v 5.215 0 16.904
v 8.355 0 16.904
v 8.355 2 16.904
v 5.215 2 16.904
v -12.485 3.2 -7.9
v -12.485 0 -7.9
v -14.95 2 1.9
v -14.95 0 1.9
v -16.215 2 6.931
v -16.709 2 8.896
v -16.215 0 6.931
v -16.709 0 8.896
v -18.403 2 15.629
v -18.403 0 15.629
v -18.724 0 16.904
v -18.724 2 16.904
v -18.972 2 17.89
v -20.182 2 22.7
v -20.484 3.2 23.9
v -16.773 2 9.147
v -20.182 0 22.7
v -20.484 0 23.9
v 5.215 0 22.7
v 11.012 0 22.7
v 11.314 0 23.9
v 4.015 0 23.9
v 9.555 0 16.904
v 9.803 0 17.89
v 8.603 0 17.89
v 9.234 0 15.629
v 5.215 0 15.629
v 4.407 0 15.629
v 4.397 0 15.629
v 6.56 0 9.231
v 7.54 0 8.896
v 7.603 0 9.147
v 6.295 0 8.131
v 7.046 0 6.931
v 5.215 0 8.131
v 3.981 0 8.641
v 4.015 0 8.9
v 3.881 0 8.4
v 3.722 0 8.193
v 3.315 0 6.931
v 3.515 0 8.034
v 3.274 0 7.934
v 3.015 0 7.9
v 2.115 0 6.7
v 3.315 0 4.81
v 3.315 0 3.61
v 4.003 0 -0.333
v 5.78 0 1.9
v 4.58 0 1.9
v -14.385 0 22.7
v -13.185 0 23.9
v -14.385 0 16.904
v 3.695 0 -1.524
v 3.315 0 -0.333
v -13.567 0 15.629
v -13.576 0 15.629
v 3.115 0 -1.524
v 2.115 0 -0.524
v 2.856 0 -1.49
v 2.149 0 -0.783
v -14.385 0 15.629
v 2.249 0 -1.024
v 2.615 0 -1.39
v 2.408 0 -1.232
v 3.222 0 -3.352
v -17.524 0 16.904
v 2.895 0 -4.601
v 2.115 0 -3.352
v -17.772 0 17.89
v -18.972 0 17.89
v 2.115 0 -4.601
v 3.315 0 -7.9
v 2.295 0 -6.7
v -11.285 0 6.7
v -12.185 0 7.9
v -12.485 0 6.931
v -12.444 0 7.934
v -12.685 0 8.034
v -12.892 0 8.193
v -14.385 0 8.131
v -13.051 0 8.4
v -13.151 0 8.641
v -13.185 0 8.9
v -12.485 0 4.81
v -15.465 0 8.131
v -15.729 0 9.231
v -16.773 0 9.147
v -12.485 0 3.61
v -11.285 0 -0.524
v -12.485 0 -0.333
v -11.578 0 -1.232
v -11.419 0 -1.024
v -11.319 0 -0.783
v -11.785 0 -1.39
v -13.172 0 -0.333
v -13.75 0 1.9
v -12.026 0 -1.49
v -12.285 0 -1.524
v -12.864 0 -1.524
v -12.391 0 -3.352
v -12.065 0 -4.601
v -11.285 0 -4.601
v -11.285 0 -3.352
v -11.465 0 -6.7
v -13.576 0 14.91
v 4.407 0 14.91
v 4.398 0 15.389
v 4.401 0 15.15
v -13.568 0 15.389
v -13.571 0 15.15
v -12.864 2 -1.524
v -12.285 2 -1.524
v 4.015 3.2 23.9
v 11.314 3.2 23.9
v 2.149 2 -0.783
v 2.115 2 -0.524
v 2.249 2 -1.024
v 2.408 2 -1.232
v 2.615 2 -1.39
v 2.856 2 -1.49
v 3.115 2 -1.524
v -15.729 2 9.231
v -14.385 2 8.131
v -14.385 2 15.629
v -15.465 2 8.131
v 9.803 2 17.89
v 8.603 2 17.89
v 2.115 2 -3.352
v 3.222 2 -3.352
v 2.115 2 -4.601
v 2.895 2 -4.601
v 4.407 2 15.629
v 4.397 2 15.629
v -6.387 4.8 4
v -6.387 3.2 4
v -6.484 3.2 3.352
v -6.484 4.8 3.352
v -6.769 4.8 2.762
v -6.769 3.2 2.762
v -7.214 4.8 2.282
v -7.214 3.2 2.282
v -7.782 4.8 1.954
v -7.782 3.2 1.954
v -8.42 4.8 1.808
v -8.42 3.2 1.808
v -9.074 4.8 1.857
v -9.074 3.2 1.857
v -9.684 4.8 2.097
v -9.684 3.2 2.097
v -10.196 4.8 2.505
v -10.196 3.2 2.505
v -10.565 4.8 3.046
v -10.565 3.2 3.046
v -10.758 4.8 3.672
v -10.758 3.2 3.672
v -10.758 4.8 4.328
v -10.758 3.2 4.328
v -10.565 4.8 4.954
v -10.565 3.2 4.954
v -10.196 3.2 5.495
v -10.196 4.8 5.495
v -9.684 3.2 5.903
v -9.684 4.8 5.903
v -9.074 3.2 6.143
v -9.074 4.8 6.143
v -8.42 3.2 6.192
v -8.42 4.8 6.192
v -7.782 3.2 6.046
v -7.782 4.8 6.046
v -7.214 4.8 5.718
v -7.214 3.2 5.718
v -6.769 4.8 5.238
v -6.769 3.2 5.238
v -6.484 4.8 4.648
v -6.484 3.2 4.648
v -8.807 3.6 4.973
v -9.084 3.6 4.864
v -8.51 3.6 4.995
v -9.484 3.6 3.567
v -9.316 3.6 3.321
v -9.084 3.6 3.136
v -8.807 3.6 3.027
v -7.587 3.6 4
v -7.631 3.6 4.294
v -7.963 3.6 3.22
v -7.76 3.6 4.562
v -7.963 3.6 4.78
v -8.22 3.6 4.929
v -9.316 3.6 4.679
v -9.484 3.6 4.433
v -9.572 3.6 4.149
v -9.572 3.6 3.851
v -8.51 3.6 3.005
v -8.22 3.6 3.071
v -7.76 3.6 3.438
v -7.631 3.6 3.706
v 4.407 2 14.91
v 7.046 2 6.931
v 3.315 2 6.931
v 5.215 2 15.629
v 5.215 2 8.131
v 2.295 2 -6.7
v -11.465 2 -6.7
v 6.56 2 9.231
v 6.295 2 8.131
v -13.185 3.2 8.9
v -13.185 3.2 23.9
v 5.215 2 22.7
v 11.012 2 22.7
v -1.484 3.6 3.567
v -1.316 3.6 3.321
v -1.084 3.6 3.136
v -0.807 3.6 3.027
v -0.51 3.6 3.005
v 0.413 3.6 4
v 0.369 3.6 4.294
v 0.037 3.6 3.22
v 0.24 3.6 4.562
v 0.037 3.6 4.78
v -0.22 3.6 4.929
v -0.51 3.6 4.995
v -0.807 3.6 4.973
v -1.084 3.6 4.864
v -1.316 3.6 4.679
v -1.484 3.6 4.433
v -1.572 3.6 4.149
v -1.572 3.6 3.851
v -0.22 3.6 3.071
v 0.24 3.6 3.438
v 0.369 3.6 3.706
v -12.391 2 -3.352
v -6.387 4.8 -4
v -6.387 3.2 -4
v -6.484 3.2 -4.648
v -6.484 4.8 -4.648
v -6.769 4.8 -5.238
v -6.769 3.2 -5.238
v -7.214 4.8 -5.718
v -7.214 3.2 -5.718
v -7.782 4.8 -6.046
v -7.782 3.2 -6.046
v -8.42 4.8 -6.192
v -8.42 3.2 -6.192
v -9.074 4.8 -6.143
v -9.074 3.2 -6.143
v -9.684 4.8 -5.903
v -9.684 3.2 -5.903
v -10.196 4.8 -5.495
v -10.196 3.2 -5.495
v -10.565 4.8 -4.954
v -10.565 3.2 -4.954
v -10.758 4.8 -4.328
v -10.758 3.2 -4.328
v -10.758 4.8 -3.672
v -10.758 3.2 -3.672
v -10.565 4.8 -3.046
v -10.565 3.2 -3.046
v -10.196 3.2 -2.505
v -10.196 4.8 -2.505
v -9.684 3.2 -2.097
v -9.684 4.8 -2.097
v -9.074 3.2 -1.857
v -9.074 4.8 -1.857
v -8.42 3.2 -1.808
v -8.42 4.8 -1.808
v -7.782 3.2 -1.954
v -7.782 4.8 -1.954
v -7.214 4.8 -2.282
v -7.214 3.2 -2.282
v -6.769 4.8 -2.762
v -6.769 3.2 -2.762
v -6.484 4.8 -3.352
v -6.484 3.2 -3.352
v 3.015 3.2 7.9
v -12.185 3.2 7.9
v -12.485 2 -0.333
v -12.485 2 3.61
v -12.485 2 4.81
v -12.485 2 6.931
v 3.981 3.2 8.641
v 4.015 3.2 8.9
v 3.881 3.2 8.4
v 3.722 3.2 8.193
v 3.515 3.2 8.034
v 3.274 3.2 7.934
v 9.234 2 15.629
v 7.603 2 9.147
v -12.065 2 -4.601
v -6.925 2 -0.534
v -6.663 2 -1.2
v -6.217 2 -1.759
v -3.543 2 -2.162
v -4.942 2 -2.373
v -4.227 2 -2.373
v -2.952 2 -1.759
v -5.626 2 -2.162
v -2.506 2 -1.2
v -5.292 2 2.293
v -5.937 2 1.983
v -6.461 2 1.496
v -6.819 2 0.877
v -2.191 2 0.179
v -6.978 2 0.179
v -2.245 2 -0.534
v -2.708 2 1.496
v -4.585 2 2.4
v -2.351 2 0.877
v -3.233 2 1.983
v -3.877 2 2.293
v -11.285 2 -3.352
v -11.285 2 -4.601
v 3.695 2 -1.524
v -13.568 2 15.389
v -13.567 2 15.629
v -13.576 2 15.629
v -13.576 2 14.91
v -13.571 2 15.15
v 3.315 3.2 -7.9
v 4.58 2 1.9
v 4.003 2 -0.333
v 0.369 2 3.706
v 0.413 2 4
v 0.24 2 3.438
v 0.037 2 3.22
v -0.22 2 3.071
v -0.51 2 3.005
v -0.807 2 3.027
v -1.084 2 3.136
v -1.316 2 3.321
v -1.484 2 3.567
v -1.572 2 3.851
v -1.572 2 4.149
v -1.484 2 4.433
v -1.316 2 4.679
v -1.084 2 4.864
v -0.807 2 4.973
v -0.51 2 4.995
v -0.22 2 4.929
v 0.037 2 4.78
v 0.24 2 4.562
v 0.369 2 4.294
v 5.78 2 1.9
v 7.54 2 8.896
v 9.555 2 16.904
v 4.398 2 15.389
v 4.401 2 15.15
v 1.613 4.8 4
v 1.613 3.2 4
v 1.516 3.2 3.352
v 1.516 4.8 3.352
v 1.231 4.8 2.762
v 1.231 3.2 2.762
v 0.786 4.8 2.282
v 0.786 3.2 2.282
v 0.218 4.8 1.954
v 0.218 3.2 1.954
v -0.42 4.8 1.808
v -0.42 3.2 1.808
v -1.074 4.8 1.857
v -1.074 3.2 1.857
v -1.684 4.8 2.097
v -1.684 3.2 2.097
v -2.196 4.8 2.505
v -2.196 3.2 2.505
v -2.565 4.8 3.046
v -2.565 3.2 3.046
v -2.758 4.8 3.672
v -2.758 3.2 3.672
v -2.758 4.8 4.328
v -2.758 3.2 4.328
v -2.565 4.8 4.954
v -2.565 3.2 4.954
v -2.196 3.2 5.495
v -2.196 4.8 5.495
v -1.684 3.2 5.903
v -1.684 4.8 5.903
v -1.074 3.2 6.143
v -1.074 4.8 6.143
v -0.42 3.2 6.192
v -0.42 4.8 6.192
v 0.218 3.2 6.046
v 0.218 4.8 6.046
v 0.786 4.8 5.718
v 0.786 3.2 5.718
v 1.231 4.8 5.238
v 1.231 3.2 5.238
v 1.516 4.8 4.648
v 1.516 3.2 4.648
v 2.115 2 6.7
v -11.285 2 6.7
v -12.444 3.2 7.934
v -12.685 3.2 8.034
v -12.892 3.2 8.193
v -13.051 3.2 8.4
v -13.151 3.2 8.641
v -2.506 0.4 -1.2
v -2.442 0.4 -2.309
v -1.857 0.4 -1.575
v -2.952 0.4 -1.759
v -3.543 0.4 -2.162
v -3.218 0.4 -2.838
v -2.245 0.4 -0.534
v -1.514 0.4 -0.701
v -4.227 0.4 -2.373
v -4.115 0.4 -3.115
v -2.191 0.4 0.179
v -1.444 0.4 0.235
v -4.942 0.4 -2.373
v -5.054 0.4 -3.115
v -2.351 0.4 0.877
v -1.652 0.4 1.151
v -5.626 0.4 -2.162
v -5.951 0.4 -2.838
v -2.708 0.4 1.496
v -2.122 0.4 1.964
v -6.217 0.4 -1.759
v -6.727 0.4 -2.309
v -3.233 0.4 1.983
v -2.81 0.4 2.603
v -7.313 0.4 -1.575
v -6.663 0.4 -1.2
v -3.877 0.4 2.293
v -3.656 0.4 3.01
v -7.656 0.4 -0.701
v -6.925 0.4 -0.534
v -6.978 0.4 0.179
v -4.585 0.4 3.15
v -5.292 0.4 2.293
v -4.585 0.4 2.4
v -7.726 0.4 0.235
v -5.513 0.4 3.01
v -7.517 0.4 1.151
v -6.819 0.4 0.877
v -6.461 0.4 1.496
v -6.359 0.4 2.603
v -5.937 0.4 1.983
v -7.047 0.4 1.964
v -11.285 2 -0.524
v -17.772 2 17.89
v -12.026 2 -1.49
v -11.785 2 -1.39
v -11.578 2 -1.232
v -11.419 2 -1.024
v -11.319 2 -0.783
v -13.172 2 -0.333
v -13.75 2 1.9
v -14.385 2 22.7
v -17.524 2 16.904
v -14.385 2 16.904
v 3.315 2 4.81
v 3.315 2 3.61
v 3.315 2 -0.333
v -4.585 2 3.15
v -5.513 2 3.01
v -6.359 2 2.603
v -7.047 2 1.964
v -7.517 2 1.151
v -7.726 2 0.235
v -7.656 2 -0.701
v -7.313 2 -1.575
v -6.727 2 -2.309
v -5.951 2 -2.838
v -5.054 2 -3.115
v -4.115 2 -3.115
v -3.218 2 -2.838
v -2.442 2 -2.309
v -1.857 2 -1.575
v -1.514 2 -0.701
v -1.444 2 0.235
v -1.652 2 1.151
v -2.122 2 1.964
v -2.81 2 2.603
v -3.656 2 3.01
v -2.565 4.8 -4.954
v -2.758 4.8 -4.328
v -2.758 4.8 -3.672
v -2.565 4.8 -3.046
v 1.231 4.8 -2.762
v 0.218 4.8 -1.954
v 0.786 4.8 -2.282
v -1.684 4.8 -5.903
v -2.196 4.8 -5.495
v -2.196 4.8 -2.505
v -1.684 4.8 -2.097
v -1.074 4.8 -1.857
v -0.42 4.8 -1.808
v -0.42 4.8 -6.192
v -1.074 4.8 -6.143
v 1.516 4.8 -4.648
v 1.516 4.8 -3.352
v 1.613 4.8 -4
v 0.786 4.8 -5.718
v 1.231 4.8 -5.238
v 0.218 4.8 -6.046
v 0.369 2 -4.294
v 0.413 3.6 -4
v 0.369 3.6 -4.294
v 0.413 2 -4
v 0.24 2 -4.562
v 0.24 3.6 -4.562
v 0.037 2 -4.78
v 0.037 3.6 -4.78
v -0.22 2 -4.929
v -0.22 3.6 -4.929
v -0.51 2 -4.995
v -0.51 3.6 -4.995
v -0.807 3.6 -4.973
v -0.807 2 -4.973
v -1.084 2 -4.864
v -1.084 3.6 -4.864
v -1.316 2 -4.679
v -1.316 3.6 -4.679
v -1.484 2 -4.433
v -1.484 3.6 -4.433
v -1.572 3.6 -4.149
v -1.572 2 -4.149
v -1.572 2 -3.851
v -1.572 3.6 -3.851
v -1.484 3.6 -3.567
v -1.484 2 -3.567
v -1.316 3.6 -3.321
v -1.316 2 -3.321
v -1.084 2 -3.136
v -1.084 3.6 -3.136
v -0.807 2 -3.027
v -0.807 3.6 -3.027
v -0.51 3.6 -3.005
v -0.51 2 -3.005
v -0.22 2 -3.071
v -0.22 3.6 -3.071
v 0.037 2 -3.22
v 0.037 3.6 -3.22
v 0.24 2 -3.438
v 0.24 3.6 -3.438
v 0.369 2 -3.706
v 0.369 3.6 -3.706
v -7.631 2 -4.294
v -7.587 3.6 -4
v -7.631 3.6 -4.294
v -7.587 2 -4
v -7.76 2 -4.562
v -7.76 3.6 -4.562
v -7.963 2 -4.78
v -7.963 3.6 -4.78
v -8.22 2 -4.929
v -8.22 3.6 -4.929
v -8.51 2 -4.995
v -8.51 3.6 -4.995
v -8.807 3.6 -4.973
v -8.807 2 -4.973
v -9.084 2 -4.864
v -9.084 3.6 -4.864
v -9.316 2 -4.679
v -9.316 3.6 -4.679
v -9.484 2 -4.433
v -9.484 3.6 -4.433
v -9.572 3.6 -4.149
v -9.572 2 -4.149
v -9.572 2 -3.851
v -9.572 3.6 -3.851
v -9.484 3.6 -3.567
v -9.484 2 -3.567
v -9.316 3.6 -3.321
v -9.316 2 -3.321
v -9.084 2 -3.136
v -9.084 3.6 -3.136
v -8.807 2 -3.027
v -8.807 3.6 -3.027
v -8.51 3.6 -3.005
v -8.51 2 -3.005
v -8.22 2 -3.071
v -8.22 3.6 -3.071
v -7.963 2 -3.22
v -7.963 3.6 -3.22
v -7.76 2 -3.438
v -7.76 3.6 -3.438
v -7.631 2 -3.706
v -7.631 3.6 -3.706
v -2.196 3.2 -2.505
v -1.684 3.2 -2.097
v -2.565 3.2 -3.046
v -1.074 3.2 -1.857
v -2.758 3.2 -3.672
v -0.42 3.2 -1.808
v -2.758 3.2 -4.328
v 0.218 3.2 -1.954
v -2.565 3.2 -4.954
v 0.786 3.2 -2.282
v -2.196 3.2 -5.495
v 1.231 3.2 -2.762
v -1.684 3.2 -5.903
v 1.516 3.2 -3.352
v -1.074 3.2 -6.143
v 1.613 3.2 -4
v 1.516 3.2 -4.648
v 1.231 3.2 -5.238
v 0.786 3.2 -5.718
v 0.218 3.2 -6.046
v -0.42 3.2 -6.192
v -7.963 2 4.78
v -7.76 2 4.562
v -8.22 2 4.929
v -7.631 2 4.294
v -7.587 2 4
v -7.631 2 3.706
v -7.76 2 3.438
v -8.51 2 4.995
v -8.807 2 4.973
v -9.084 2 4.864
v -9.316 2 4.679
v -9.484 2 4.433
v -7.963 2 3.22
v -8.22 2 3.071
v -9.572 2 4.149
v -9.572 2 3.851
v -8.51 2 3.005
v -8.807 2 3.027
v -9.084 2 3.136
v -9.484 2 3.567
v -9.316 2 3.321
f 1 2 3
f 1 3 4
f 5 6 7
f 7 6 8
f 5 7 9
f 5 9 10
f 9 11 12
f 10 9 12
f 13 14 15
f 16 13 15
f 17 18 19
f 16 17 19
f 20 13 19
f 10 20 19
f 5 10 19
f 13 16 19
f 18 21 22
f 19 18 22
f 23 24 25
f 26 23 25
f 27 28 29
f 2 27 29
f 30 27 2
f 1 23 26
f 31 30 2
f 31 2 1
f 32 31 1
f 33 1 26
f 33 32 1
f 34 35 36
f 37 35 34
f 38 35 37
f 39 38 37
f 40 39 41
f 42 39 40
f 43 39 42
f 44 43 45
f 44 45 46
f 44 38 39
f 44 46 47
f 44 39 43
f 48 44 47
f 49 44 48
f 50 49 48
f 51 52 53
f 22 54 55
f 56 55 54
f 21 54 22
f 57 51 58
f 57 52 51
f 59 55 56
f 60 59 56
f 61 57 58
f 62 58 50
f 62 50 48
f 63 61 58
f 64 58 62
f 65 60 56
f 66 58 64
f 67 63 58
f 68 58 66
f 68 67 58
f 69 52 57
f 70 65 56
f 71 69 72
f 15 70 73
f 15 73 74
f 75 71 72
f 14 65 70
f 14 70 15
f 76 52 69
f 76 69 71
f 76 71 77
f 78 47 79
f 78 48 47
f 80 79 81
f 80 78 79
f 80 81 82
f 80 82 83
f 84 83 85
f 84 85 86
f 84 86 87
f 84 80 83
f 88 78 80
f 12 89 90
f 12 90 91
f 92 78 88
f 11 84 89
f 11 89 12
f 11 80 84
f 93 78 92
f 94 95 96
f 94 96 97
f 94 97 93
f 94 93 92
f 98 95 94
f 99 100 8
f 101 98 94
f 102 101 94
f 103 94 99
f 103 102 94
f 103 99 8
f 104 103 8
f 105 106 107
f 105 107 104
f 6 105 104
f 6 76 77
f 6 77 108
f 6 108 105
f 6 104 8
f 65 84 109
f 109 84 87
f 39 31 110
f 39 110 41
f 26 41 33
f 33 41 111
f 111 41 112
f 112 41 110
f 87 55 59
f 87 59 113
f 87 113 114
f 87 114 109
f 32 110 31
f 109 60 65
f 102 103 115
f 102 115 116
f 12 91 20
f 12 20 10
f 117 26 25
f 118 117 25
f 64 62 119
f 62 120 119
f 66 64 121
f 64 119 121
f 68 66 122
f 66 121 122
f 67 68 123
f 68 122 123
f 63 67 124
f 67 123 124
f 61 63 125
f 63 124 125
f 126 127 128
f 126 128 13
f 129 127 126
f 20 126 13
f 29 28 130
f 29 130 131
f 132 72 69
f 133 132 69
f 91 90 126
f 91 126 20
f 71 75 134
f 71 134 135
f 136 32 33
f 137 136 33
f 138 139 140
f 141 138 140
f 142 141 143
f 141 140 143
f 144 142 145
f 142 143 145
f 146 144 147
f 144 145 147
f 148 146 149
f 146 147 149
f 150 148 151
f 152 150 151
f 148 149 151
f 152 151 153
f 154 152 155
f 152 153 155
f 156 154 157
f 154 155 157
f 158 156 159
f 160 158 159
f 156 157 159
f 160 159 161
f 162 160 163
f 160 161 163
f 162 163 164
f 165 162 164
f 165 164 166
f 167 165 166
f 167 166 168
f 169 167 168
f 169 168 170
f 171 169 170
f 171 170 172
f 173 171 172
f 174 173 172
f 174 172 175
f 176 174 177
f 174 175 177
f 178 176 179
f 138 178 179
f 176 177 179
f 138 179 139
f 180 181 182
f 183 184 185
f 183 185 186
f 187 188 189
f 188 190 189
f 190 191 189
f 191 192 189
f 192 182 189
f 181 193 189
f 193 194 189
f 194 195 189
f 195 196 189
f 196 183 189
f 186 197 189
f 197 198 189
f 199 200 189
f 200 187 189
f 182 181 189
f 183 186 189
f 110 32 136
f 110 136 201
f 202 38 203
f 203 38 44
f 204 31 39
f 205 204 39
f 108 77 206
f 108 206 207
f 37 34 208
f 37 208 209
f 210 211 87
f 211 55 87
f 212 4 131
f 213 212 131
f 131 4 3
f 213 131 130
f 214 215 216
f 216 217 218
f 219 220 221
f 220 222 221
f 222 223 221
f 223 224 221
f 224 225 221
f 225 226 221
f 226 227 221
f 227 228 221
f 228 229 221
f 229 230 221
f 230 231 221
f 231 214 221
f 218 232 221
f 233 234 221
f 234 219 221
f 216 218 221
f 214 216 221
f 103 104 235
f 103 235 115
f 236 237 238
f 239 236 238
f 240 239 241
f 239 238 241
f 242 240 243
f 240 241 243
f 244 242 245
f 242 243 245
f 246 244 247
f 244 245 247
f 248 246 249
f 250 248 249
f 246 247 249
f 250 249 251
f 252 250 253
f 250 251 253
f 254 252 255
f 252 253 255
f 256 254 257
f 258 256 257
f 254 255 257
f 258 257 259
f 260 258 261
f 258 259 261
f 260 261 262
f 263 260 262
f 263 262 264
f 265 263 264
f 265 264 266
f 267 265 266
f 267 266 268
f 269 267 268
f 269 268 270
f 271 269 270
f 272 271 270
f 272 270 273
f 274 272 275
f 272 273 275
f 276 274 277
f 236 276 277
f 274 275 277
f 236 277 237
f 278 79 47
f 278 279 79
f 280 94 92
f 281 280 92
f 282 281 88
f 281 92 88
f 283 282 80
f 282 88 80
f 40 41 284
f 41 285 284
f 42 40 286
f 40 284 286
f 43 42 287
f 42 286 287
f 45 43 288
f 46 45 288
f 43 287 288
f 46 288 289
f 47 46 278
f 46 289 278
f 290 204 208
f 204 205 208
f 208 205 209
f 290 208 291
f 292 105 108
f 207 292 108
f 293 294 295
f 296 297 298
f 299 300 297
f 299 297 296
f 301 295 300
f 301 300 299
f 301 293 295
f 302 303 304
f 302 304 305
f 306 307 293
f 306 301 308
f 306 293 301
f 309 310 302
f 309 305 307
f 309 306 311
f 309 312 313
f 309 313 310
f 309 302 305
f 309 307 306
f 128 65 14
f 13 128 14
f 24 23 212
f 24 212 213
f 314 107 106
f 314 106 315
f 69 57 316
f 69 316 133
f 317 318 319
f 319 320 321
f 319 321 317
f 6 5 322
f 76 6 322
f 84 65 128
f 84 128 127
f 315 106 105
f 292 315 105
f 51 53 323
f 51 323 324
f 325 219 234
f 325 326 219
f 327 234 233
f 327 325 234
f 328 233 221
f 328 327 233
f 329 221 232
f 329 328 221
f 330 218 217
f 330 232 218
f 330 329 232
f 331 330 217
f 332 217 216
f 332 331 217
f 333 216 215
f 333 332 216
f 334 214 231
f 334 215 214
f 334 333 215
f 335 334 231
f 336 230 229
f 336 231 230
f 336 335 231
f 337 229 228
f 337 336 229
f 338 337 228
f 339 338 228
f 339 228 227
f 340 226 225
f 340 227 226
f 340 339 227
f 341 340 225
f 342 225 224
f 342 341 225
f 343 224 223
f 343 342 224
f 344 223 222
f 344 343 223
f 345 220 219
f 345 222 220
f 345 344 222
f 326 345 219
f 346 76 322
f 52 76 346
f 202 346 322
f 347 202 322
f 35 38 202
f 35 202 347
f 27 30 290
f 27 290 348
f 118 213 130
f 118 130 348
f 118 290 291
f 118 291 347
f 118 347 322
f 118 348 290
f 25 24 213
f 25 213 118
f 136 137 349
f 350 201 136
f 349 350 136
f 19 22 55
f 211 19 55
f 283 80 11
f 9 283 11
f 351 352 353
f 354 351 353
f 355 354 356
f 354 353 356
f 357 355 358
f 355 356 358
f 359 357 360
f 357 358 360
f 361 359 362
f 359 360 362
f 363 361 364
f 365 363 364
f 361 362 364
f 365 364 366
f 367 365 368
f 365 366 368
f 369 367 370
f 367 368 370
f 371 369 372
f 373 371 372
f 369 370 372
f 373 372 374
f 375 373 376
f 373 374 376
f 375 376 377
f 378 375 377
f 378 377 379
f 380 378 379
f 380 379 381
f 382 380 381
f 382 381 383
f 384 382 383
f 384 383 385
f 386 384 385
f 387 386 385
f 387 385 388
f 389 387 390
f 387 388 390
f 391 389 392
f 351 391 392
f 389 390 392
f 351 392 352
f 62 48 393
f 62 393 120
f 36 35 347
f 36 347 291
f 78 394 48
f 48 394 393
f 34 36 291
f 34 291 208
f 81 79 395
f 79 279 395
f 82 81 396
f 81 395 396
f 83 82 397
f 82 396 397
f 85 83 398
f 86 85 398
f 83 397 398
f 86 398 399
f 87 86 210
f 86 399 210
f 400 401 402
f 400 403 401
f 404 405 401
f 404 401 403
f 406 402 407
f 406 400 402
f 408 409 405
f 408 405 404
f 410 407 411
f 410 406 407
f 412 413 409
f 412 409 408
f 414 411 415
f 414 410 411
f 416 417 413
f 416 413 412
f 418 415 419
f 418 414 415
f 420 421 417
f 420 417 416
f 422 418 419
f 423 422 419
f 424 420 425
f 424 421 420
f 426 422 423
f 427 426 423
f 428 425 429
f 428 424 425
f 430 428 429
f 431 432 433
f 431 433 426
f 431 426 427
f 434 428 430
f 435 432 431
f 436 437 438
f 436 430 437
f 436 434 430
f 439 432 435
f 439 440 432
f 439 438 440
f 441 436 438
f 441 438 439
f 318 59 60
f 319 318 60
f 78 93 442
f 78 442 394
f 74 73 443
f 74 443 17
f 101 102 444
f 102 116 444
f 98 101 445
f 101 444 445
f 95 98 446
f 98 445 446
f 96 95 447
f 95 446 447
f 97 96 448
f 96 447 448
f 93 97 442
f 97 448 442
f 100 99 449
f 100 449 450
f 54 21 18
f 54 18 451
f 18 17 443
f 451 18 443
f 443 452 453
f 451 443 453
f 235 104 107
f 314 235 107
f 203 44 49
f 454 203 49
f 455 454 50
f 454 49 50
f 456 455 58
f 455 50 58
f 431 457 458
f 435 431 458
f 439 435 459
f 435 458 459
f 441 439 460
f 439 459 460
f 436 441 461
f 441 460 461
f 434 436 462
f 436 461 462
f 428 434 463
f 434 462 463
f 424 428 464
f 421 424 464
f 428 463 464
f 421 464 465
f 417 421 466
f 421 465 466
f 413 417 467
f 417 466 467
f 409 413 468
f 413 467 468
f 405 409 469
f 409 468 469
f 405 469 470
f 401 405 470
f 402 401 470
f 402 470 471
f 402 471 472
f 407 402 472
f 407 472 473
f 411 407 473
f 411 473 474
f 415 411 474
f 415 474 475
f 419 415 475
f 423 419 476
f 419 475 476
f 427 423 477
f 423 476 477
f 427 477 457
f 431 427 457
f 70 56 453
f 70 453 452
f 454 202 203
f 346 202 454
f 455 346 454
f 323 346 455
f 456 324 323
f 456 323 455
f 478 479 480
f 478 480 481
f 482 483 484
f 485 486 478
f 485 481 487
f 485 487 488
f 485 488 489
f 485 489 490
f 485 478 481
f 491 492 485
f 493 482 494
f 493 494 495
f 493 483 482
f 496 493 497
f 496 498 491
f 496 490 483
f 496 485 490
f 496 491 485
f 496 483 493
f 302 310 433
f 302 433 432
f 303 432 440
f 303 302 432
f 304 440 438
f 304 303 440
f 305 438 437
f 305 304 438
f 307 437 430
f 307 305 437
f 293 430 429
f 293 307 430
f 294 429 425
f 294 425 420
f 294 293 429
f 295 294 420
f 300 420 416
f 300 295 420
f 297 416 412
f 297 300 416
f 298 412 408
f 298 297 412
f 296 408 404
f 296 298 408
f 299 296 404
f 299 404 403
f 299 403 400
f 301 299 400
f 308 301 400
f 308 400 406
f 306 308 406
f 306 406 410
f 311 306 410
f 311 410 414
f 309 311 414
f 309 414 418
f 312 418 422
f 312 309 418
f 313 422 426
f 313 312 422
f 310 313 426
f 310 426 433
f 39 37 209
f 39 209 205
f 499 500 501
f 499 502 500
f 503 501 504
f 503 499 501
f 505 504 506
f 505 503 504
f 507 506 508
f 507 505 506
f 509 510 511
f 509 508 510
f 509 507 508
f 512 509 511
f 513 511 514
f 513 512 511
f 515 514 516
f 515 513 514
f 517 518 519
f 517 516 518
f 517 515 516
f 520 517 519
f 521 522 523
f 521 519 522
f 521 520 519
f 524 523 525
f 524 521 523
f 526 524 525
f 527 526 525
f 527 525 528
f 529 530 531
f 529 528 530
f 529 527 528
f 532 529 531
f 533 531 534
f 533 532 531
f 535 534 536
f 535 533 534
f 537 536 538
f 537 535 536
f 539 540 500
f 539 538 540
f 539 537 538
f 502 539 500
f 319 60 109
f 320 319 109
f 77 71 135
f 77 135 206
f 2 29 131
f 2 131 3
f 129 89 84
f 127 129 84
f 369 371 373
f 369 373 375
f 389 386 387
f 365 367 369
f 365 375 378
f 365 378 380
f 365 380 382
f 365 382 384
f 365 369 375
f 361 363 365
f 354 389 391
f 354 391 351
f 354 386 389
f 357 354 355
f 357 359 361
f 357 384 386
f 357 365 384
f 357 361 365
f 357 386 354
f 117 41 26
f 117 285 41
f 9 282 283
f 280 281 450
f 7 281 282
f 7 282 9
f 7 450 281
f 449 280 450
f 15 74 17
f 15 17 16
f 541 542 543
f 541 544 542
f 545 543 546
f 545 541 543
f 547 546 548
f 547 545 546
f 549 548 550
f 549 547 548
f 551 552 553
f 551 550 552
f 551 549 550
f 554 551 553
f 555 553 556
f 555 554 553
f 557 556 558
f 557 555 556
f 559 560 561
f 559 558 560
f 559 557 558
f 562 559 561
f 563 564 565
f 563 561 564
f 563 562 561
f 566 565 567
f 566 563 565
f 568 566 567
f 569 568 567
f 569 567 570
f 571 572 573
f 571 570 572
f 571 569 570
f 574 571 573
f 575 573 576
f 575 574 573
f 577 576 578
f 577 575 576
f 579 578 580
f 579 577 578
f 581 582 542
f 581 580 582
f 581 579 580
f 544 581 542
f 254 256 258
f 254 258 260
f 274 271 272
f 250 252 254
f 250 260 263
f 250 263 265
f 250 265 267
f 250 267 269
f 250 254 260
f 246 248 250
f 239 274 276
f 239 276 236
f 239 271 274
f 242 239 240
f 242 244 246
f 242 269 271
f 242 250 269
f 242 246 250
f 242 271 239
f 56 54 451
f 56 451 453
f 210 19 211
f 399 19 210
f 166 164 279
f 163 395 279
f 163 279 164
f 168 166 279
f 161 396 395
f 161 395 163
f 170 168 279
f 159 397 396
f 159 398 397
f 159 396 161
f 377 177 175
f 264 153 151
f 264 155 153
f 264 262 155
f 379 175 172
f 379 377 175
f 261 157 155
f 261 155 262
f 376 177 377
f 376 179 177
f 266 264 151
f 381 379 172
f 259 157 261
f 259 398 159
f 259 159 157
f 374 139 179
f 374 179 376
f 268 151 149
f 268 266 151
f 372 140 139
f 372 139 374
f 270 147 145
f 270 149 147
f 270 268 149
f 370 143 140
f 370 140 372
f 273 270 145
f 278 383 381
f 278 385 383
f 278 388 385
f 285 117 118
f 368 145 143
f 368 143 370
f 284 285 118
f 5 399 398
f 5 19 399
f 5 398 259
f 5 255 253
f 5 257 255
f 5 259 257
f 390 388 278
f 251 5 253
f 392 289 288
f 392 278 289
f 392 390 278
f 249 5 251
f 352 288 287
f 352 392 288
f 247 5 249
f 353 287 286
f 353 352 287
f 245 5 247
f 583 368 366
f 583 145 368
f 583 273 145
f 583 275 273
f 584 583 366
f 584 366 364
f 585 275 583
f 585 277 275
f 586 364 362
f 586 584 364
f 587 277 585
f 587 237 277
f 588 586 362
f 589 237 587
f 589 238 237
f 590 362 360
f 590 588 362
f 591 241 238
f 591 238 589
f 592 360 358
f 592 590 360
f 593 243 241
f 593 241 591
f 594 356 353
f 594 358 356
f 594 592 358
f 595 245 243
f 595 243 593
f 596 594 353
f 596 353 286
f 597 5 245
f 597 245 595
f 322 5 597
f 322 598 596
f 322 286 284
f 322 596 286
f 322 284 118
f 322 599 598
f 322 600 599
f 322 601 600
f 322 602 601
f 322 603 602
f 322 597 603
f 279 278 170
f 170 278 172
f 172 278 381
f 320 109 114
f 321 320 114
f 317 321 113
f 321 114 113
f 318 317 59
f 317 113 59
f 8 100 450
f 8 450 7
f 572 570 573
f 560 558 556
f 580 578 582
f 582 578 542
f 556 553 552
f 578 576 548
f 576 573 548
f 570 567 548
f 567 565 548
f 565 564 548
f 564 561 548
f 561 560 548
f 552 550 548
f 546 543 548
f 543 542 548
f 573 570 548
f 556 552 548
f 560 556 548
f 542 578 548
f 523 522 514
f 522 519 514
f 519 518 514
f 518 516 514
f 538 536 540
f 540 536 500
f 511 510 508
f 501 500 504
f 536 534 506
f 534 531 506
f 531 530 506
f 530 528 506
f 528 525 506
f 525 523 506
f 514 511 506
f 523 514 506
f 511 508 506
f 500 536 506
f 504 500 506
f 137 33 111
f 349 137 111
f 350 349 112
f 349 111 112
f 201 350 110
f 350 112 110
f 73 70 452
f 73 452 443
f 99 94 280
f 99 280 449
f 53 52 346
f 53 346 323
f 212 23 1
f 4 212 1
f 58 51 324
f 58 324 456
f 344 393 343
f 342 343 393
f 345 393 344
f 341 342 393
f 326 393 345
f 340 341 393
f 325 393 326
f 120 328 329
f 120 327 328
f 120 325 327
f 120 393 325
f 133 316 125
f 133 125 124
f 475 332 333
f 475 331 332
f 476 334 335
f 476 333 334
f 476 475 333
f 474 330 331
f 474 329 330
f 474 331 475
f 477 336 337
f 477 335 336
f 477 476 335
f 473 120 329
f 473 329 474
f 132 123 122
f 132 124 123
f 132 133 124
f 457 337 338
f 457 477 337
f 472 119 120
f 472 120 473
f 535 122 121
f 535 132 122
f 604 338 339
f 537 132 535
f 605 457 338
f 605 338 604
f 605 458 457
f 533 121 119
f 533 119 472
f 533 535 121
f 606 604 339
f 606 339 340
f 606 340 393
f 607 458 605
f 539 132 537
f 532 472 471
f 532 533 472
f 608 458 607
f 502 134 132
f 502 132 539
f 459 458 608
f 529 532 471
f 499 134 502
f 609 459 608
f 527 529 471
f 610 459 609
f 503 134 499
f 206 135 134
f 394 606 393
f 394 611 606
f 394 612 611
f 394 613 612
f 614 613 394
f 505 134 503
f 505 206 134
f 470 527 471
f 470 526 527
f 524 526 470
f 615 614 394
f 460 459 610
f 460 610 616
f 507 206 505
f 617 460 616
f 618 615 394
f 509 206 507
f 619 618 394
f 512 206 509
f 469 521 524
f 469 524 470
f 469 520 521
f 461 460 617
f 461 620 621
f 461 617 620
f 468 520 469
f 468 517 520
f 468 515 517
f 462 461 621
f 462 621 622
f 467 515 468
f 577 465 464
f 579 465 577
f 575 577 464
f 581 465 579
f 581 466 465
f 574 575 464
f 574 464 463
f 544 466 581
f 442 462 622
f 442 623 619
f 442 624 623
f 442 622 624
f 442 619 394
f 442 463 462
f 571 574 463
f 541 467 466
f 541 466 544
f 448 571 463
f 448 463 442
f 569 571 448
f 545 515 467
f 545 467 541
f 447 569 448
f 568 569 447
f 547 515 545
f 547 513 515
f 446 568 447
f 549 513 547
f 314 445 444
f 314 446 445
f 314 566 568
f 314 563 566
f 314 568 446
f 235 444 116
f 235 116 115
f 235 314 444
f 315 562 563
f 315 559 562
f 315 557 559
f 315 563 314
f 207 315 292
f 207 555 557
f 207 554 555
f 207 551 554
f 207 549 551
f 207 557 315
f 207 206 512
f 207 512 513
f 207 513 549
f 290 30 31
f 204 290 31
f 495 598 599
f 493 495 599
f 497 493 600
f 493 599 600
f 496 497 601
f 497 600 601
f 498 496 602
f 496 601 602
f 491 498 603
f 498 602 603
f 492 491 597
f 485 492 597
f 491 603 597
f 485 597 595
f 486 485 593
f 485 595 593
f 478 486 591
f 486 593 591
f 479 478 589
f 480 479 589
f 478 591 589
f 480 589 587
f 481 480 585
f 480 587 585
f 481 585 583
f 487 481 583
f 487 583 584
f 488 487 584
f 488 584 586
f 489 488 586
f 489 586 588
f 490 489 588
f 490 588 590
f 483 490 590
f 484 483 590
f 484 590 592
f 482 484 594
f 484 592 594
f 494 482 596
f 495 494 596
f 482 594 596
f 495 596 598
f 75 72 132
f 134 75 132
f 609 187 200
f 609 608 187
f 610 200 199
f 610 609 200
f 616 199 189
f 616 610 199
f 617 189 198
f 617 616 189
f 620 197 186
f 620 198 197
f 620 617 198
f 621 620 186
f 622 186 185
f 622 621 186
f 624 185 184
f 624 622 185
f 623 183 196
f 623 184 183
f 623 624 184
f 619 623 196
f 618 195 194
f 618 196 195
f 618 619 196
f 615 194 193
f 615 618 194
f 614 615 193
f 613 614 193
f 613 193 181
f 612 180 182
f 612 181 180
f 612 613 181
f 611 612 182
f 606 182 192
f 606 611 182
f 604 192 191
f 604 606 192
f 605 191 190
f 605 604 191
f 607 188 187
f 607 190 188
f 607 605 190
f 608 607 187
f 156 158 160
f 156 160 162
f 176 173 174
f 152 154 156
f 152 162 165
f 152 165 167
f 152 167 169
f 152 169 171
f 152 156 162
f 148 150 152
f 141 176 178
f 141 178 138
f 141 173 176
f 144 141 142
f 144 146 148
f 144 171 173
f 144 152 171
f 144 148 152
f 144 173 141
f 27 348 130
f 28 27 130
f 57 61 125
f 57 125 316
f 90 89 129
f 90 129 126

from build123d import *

# Parameters (mm, degrees)
BASEFRAMESKETCH_W           = 15.8
BASEFRAMESKETCH_H           = 3.2
BASEFRAME_DEPTH             = 7.9
STUDSSKETCH_R               = 2.197938665
STUDS_DEPTH                 = 1.6
MAINSTUDSPATTERN_COUNT      = 2
MAINSTUDSPATTERN_PITCH      = 8
MAINSTUDSPATTERN_COUNT_DIR2 = 2
MAINSTUDSPATTERN_PITCH_DIR2 = 8
MAINBASESHELL_T             = -1.2
UNDERCIRCLESKETCH_R         = 3.15
UNDERCIRCLESKETCH_R_2       = 2.4
UNDERCIRCLEEXTRUDE_DEPTH    = 1.6
ASHAPEDEDGECUT_DEPTH        = 2
MOVE_FACE2_DEPTH            = 3.2
FILLET11_R                  = 1
SKETCH120_W                 = 2.012808249
SKETCH120_H                 = 1.2
SKETCH120_W_2               = 1.2
SKETCH120_H_2               = 0.829639146
CUT_EXTRUDE44_DEPTH         = 2
SKETCH122_W                 = 1.2
SKETCH122_H                 = 3.019966153
CUT_EXTRUDE45_DEPTH         = 2
CUT_EXTRUDE46_DEPTH         = 34.570089444
BOSS_EXTRUDE28_REACH        = 33.841
SKETCH125_W                 = 0.808534165
SKETCH125_H                 = 7.497721331
SKETCH125_H_2               = 5.795554142
FILLET12_R                  = 1


# Read off the part's stored shape, not the designer's step: Move Face2
with BuildPart() as part:
    # BaseFrameSketch → BaseFrame (new, symmetric)
    with BuildSketch(Plane.XY):
        with Locations((-4.584729064, 1.6)):
            Rectangle(BASEFRAMESKETCH_W, BASEFRAMESKETCH_H)
    extrude(amount=BASEFRAME_DEPTH, both=True)

    # StudsSketch → Studs (add)
    with BuildSketch(Plane(origin=(0, 3.2, 0), x_dir=(1, 0, 0), z_dir=(0, 1, 0))):
        with Locations((-8.584729064, 4)):
            Circle(STUDSSKETCH_R)
    studs = extrude(amount=STUDS_DEPTH)

    # MainStudsPattern: Studs 2 × 2
    with Locations(*[(i * MAINSTUDSPATTERN_PITCH, 0, j * MAINSTUDSPATTERN_PITCH_DIR2) for i in range(MAINSTUDSPATTERN_COUNT) for j in range(MAINSTUDSPATTERN_COUNT_DIR2) if (i, j) != (0, 0)]):
        add(studs)

    # MainBaseShell
    mainbaseshell_openings = [part.faces().sort_by_distance(p)[0] for p in [
        (-4.584729064, 0, 0),
    ]]
    offset(amount=MAINBASESHELL_T, openings=mainbaseshell_openings, kind=Kind.INTERSECTION)

    # UnderCircleSketch → UnderCircleExtrude (add)
    with BuildSketch(Plane(origin=(0, 2, 0), x_dir=(-1, 0, 0), z_dir=(0, -1, 0))):
        with Locations(Location((4.584729064, 0, 0), (0, 0, 270))):
            Circle(UNDERCIRCLESKETCH_R)
        with Locations(Location((4.584729064, 0, 0), (0, 0, 270))):
            Circle(UNDERCIRCLESKETCH_R_2, mode=Mode.SUBTRACT)
    extrude(amount=UNDERCIRCLEEXTRUDE_DEPTH)

    # Sweep1: sweep along a curve in space
    with BuildLine() as sweep1_path:
        Line((3.315270936, 0, 7.9), (3.315270936, 3.2, 7.9))
    # Sketch10 → Sweep1 (sweep)
    with BuildSketch(Plane(origin=(0, 3.2, 0), x_dir=(1, 0, 0), z_dir=(0, 1, 0))):
        Polygon((-20.484729064, -16.11), (-13.184729064, -16.11), (-13.184729064, -7.9), (-12.484729064, -7.9), (-12.484729064, 7.9), align=None)
        Polygon((4.015270936, -7.9), (3.315270936, -7.9), (3.315270936, 7.9), (11.315270936, -16.11), (4.015270936, -16.11), align=None)
    sweep(path=sweep1_path.line)

    # Sketch11 → AShapedEdgeCut (cut)
    with BuildSketch(Plane(origin=(0, 0, 0), x_dir=(-1, 0, 0), z_dir=(0, -1, 0))):
        Polygon((-3.315270936, 3.352483875), (-3.598074089, 3.352483875), (-5.380624164, -1.900141374), (-6.580624164, -1.900141374), (-8.256846476, -6.930903588), (-3.315270936, -6.930903588), (-3.315270936, -4.81), (-5.328079185, -4.81), (-5.328079185, -3.61), (-3.315270936, -3.61), align=None)
        Polygon((-7.759680606, -8.895572671), (-7.759680606, -9.725211817), (-6.559680606, -9.725211817), (-6.559680606, -8.130903588), (-4.406736771, -8.130903588), (-4.406736771, -14.91), (-9.466166686, -14.91), (-9.466166686, -14.321814496), (-10.576862573, -13.893851901), (-8.911463413, -8.895572671), align=None)
        Polygon((-2.115270936, 4.601321399), (-2.895270936, 4.601321399), (-2.295270936, 6.7), (-2.115270936, 6.7), align=None)
        Polygon((18.635624814, -14.321814496), (19.746320701, -13.893851901), (18.080921541, -8.895572671), (16.929138734, -8.895572671), (16.929138734, -9.725211817), (15.729138734, -9.725211817), (15.729138734, -8.130903588), (13.576194899, -8.130903588), (13.576194899, -14.91), (18.635624814, -14.91), align=None)
        Polygon((12.484729064, -6.930903588), (17.426304604, -6.930903588), (15.750082292, -1.900141374), (14.550082292, -1.900141374), (12.767532217, 3.352483875), (12.484729064, 3.352483875), (12.484729064, -3.61), (14.497537313, -3.61), (14.497537313, -4.81), (12.484729064, -4.81), align=None)
        Polygon((12.064729064, 4.601321399), (11.464729064, 6.7), (11.284729064, 6.7), (11.284729064, 4.601321399), align=None)
    extrude(amount=-ASHAPEDEDGECUT_DEPTH, mode=Mode.SUBTRACT)

    # Move Face2 outline → Move Face2 (add)
    with BuildSketch(Plane(origin=(0, 0, 0), x_dir=(1, 0, 0), z_dir=(0, 1, 0))):
        Polygon((-13.184729064, -16.11), (-20.484729064, -16.11), (-23.080314237, -23.9), (-13.184729064, -23.9), align=None)
        Polygon((4.015270936, -16.11), (4.015270936, -23.9), (13.910856109, -23.9), (11.315270936, -16.11), align=None)
    extrude(amount=MOVE_FACE2_DEPTH)

    # Fillet11
    fillet11_edges = [part.edges().sort_by_distance(p)[0] for p in [
        (-13.184729064, 1.6, 7.9),
        (4.015270936, 1.6, 7.9),
    ]]
    fillet(fillet11_edges, radius=FILLET11_R)

    # Sketch120 → Cut-Extrude44 (cut)
    with BuildSketch(Plane(origin=(0, 0, 0), x_dir=(-1, 0, 0), z_dir=(0, -1, 0))):
        with Locations((-4.321675061, -4.21)):
            Rectangle(SKETCH120_W, SKETCH120_H)
        Polygon((-4.406736771, -16.11), (-4.406736771, -22.7), (-11.974329928, -22.7), (-11.557573226, -21.355984621), (-12.912753937, -20.904445858), (-11.315270936, -16.11), align=None)
        with Locations((-7.159680606, -9.310392244)):
            Rectangle(SKETCH120_W_2, SKETCH120_H_2)
        Polygon((13.576194899, -16.11), (20.484729064, -16.11), (22.082212066, -20.904445858), (20.727031354, -21.355984621), (21.143788056, -22.7), (13.576194899, -22.7), align=None)
        with Locations((16.329138734, -9.310392244)):
            Rectangle(SKETCH120_W_2, SKETCH120_H_2)
        with Locations((13.491133189, -4.21)):
            Rectangle(SKETCH120_W, SKETCH120_H)
    extrude(amount=-CUT_EXTRUDE44_DEPTH, mode=Mode.SUBTRACT)

    # Sweep30: sweep along a curve in space
    with BuildLine() as sweep30_path:
        Line((11.315270936, 2, 16.11), (11.315270936, 0, 16.11))
    # Sketch121 → Sweep30 (sweep)
    with BuildSketch(Plane(origin=(0, 0, 0), x_dir=(-1, 0, 0), z_dir=(0, -1, 0))):
        Polygon((-11.579975928, -16.904445858), (-4.406736771, -16.904445858), (-4.406736771, -15.858354428), (-11.231424015, -15.858354428), align=None)
        Polygon((13.576194899, -15.858354428), (20.400882143, -15.858354428), (20.749434056, -16.904445858), (13.576194899, -16.904445858), align=None)
    sweep(path=sweep30_path.line)

    # Sketch122 → Cut-Extrude45 (cut)
    with BuildSketch(Plane(origin=(0, 0, 0), x_dir=(-1, 0, 0), z_dir=(0, -1, 0))):
        with BuildLine():
            Line((-9.466166686, -14.321814496), (-9.706013399, -15.628624919))
            Line((-9.706013399, -15.628624919), (-9.645171378, -15.628624919))
            Line((-9.645171378, -15.628624919), (-4.39726815, -15.628624919))
            ThreePointArc((-4.39726815, -15.628624919), (-4.399635408, -15.269281271), (-4.406736771, -14.91))
            Line((-4.406736771, -14.91), (-9.360110841, -14.91))
            Line((-9.360110841, -14.91), (-9.466166686, -14.91))
            Line((-9.466166686, -14.91), (-9.466166686, -14.321814496))
        make_face()
        with BuildLine():
            Line((18.635624814, -14.321814496), (18.635624814, -14.91))
            Line((18.635624814, -14.91), (18.529568969, -14.91))
            Line((18.529568969, -14.91), (13.576194899, -14.91))
            ThreePointArc((13.576194899, -14.91), (13.569093536, -15.269281271), (13.566726278, -15.628624919))
            Line((13.566726278, -15.628624919), (18.814629506, -15.628624919))
            Line((18.814629506, -15.628624919), (18.875471527, -15.628624919))
            Line((18.875471527, -15.628624919), (18.635624814, -14.321814496))
        make_face()
        with Locations((-2.715270936, 1.842500799)):
            Rectangle(SKETCH122_W, SKETCH122_H)
        with Locations((11.884729064, 1.842500799)):
            Rectangle(SKETCH122_W, SKETCH122_H)
    extrude(amount=-CUT_EXTRUDE45_DEPTH, mode=Mode.SUBTRACT)

    # Sketch123 → Cut-Extrude46 (cut, through all)
    with BuildSketch(Plane(origin=(0, 0, 0), x_dir=(-1, 0, 0), z_dir=(0, -1, 0))):
        Polygon((-11.314156863, -23.9), (-13.910856109, -23.9), (-3.315270936, 7.9), align=None)
        Polygon((20.483614991, -23.9), (23.080314237, -23.9), (12.484729064, 7.9), align=None)
    extrude(amount=-CUT_EXTRUDE46_DEPTH, mode=Mode.SUBTRACT)

    # Sketch125 → Boss-Extrude28 (add, up to next)
    with BuildSketch(Plane(origin=(0, 0, 0), x_dir=(-1, 0, 0), z_dir=(0, -1, 0)), mode=Mode.PRIVATE) as boss_extrude28_sk1:
        Polygon((-3.598074089, 3.352483875), (-5.380624164, -1.900141374), (-4.580371971, -1.900141374), (-4.002886188, 0.332517722), (-2.115270936, 0.332517722), (-2.115270936, 1.524445932), (-3.694589414, 1.524445932), (-3.221760433, 3.352483875), align=None)
    boss_extrude28_tool1 = extrude(boss_extrude28_sk1.sketch, amount=-BOSS_EXTRUDE28_REACH, mode=Mode.PRIVATE) - part.part
    # Sketch125 → Boss-Extrude28 (add, up to next)
    with BuildSketch(Plane(origin=(0, 0, 0), x_dir=(-1, 0, 0), z_dir=(0, -1, 0)), mode=Mode.PRIVATE) as boss_extrude28_sk2:
        Polygon((13.749830099, -1.900141374), (14.550082292, -1.900141374), (12.767532217, 3.352483875), (12.391218561, 3.352483875), (12.864047542, 1.524445932), (11.284729064, 1.524445932), (11.284729064, 0.332517722), (13.172344316, 0.332517722), align=None)
    boss_extrude28_tool2 = extrude(boss_extrude28_sk2.sketch, amount=-BOSS_EXTRUDE28_REACH, mode=Mode.PRIVATE) - part.part
    # Sketch125 → Boss-Extrude28 (add, up to next)
    with BuildSketch(Plane(origin=(0, 0, 0), x_dir=(-1, 0, 0), z_dir=(0, -1, 0)), mode=Mode.PRIVATE) as boss_extrude28_sk3:
        Polygon((-6.559680606, -8.895572671), (-7.539983825, -8.895572671), (-7.603300806, -9.147292725), (-6.559680606, -9.230770127), (-6.295168575, -8.130903588), (-6.559680606, -8.130903588), align=None)
    boss_extrude28_tool3 = extrude(boss_extrude28_sk3.sketch, amount=-BOSS_EXTRUDE28_REACH, mode=Mode.PRIVATE) - part.part
    # Sketch125 → Boss-Extrude28 (add, up to next)
    with BuildSketch(Plane(origin=(0, 0, 0), x_dir=(-1, 0, 0), z_dir=(0, -1, 0)), mode=Mode.PRIVATE) as boss_extrude28_sk4:
        with Locations((-4.811003854, -11.879764254)):
            Rectangle(SKETCH125_W, SKETCH125_H)
    boss_extrude28_tool4 = extrude(boss_extrude28_sk4.sketch, amount=-BOSS_EXTRUDE28_REACH, mode=Mode.PRIVATE) - part.part
    # Sketch125 → Boss-Extrude28 (add, up to next)
    with BuildSketch(Plane(origin=(0, 0, 0), x_dir=(-1, 0, 0), z_dir=(0, -1, 0)), mode=Mode.PRIVATE) as boss_extrude28_sk5:
        Polygon((16.772758935, -9.147292725), (16.709441953, -8.895572671), (15.729138734, -8.895572671), (15.729138734, -8.130903588), (15.464626703, -8.130903588), (15.729138734, -9.230770127), align=None)
    boss_extrude28_tool5 = extrude(boss_extrude28_sk5.sketch, amount=-BOSS_EXTRUDE28_REACH, mode=Mode.PRIVATE) - part.part
    # Sketch125 → Boss-Extrude28 (add, up to next)
    with BuildSketch(Plane(origin=(0, 0, 0), x_dir=(-1, 0, 0), z_dir=(0, -1, 0)), mode=Mode.PRIVATE) as boss_extrude28_sk6:
        with Locations((-4.811003854, -19.802222929)):
            Rectangle(SKETCH125_W, SKETCH125_H_2)
    boss_extrude28_tool6 = extrude(boss_extrude28_sk6.sketch, amount=-BOSS_EXTRUDE28_REACH, mode=Mode.PRIVATE) - part.part
    # Sketch125 → Boss-Extrude28 (add, up to next)
    with BuildSketch(Plane(origin=(0, 0, 0), x_dir=(-1, 0, 0), z_dir=(0, -1, 0)), mode=Mode.PRIVATE) as boss_extrude28_sk7:
        Polygon((-8.602501167, -17.890331705), (-8.354514109, -16.904445858), (-9.554514109, -16.904445858), (-9.802501167, -17.890331705), align=None)
    boss_extrude28_tool7 = extrude(boss_extrude28_sk7.sketch, amount=-BOSS_EXTRUDE28_REACH, mode=Mode.PRIVATE) - part.part
    # Sketch125 → Boss-Extrude28 (add, up to next)
    with BuildSketch(Plane(origin=(0, 0, 0), x_dir=(-1, 0, 0), z_dir=(0, -1, 0)), mode=Mode.PRIVATE) as boss_extrude28_sk8:
        with Locations((13.980461981, -11.879764254)):
            Rectangle(SKETCH125_W, SKETCH125_H)
    boss_extrude28_tool8 = extrude(boss_extrude28_sk8.sketch, amount=-BOSS_EXTRUDE28_REACH, mode=Mode.PRIVATE) - part.part
    # Sketch125 → Boss-Extrude28 (add, up to next)
    with BuildSketch(Plane(origin=(0, 0, 0), x_dir=(-1, 0, 0), z_dir=(0, -1, 0)), mode=Mode.PRIVATE) as boss_extrude28_sk9:
        with Locations((13.980461981, -19.802222929)):
            Rectangle(SKETCH125_W, SKETCH125_H_2)
    boss_extrude28_tool9 = extrude(boss_extrude28_sk9.sketch, amount=-BOSS_EXTRUDE28_REACH, mode=Mode.PRIVATE) - part.part
    # Sketch125 → Boss-Extrude28 (add, up to next)
    with BuildSketch(Plane(origin=(0, 0, 0), x_dir=(-1, 0, 0), z_dir=(0, -1, 0)), mode=Mode.PRIVATE) as boss_extrude28_sk10:
        Polygon((18.723972237, -16.904445858), (17.523972237, -16.904445858), (17.771959295, -17.890331705), (18.971959295, -17.890331705), align=None)
    boss_extrude28_tool10 = extrude(boss_extrude28_sk10.sketch, amount=-BOSS_EXTRUDE28_REACH, mode=Mode.PRIVATE) - part.part
    add(boss_extrude28_tool1.solids().sort_by_distance((3.766497, 0, -0.611125))[0])
    add(boss_extrude28_tool2.solids().sort_by_distance((-12.935955, 0, -0.611125))[0])
    add(boss_extrude28_tool3.solids().sort_by_distance((7.049832, 0, 8.912663))[0])
    add(boss_extrude28_tool4.solids().sort_by_distance((4.811004, 0, 11.879764))[0])
    add(boss_extrude28_tool5.solids().sort_by_distance((-16.724526, 0, 9.025602))[0])
    add(boss_extrude28_tool6.solids().sort_by_distance((4.811004, 0, 19.802223))[0])
    add(boss_extrude28_tool7.solids().sort_by_distance((9.078508, 0, 17.397389))[0])
    add(boss_extrude28_tool8.solids().sort_by_distance((-13.980462, 0, 11.879764))[0])
    add(boss_extrude28_tool9.solids().sort_by_distance((-13.980462, 0, 19.802223))[0])
    add(boss_extrude28_tool10.solids().sort_by_distance((-18.247966, 0, 17.397389))[0])

    # Fillet12
    fillet12_edges = [part.edges().sort_by_distance(p)[0] for p in [
        (-11.284729064, 1, -1.524445932),
        (2.115270936, 1, -1.524445932),
    ]]
    fillet(fillet12_edges, radius=FILLET12_R)


solid = part.part
